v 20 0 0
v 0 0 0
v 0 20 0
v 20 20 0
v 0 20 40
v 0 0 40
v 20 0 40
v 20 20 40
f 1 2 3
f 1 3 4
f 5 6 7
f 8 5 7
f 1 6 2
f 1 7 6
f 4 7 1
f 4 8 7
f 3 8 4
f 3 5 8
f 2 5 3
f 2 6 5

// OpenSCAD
$fn = 100;
w = 20;
h = 40;

linear_extrude(h)
//linear_extrude(height = h, center = false, twist = 0)

square(w);
